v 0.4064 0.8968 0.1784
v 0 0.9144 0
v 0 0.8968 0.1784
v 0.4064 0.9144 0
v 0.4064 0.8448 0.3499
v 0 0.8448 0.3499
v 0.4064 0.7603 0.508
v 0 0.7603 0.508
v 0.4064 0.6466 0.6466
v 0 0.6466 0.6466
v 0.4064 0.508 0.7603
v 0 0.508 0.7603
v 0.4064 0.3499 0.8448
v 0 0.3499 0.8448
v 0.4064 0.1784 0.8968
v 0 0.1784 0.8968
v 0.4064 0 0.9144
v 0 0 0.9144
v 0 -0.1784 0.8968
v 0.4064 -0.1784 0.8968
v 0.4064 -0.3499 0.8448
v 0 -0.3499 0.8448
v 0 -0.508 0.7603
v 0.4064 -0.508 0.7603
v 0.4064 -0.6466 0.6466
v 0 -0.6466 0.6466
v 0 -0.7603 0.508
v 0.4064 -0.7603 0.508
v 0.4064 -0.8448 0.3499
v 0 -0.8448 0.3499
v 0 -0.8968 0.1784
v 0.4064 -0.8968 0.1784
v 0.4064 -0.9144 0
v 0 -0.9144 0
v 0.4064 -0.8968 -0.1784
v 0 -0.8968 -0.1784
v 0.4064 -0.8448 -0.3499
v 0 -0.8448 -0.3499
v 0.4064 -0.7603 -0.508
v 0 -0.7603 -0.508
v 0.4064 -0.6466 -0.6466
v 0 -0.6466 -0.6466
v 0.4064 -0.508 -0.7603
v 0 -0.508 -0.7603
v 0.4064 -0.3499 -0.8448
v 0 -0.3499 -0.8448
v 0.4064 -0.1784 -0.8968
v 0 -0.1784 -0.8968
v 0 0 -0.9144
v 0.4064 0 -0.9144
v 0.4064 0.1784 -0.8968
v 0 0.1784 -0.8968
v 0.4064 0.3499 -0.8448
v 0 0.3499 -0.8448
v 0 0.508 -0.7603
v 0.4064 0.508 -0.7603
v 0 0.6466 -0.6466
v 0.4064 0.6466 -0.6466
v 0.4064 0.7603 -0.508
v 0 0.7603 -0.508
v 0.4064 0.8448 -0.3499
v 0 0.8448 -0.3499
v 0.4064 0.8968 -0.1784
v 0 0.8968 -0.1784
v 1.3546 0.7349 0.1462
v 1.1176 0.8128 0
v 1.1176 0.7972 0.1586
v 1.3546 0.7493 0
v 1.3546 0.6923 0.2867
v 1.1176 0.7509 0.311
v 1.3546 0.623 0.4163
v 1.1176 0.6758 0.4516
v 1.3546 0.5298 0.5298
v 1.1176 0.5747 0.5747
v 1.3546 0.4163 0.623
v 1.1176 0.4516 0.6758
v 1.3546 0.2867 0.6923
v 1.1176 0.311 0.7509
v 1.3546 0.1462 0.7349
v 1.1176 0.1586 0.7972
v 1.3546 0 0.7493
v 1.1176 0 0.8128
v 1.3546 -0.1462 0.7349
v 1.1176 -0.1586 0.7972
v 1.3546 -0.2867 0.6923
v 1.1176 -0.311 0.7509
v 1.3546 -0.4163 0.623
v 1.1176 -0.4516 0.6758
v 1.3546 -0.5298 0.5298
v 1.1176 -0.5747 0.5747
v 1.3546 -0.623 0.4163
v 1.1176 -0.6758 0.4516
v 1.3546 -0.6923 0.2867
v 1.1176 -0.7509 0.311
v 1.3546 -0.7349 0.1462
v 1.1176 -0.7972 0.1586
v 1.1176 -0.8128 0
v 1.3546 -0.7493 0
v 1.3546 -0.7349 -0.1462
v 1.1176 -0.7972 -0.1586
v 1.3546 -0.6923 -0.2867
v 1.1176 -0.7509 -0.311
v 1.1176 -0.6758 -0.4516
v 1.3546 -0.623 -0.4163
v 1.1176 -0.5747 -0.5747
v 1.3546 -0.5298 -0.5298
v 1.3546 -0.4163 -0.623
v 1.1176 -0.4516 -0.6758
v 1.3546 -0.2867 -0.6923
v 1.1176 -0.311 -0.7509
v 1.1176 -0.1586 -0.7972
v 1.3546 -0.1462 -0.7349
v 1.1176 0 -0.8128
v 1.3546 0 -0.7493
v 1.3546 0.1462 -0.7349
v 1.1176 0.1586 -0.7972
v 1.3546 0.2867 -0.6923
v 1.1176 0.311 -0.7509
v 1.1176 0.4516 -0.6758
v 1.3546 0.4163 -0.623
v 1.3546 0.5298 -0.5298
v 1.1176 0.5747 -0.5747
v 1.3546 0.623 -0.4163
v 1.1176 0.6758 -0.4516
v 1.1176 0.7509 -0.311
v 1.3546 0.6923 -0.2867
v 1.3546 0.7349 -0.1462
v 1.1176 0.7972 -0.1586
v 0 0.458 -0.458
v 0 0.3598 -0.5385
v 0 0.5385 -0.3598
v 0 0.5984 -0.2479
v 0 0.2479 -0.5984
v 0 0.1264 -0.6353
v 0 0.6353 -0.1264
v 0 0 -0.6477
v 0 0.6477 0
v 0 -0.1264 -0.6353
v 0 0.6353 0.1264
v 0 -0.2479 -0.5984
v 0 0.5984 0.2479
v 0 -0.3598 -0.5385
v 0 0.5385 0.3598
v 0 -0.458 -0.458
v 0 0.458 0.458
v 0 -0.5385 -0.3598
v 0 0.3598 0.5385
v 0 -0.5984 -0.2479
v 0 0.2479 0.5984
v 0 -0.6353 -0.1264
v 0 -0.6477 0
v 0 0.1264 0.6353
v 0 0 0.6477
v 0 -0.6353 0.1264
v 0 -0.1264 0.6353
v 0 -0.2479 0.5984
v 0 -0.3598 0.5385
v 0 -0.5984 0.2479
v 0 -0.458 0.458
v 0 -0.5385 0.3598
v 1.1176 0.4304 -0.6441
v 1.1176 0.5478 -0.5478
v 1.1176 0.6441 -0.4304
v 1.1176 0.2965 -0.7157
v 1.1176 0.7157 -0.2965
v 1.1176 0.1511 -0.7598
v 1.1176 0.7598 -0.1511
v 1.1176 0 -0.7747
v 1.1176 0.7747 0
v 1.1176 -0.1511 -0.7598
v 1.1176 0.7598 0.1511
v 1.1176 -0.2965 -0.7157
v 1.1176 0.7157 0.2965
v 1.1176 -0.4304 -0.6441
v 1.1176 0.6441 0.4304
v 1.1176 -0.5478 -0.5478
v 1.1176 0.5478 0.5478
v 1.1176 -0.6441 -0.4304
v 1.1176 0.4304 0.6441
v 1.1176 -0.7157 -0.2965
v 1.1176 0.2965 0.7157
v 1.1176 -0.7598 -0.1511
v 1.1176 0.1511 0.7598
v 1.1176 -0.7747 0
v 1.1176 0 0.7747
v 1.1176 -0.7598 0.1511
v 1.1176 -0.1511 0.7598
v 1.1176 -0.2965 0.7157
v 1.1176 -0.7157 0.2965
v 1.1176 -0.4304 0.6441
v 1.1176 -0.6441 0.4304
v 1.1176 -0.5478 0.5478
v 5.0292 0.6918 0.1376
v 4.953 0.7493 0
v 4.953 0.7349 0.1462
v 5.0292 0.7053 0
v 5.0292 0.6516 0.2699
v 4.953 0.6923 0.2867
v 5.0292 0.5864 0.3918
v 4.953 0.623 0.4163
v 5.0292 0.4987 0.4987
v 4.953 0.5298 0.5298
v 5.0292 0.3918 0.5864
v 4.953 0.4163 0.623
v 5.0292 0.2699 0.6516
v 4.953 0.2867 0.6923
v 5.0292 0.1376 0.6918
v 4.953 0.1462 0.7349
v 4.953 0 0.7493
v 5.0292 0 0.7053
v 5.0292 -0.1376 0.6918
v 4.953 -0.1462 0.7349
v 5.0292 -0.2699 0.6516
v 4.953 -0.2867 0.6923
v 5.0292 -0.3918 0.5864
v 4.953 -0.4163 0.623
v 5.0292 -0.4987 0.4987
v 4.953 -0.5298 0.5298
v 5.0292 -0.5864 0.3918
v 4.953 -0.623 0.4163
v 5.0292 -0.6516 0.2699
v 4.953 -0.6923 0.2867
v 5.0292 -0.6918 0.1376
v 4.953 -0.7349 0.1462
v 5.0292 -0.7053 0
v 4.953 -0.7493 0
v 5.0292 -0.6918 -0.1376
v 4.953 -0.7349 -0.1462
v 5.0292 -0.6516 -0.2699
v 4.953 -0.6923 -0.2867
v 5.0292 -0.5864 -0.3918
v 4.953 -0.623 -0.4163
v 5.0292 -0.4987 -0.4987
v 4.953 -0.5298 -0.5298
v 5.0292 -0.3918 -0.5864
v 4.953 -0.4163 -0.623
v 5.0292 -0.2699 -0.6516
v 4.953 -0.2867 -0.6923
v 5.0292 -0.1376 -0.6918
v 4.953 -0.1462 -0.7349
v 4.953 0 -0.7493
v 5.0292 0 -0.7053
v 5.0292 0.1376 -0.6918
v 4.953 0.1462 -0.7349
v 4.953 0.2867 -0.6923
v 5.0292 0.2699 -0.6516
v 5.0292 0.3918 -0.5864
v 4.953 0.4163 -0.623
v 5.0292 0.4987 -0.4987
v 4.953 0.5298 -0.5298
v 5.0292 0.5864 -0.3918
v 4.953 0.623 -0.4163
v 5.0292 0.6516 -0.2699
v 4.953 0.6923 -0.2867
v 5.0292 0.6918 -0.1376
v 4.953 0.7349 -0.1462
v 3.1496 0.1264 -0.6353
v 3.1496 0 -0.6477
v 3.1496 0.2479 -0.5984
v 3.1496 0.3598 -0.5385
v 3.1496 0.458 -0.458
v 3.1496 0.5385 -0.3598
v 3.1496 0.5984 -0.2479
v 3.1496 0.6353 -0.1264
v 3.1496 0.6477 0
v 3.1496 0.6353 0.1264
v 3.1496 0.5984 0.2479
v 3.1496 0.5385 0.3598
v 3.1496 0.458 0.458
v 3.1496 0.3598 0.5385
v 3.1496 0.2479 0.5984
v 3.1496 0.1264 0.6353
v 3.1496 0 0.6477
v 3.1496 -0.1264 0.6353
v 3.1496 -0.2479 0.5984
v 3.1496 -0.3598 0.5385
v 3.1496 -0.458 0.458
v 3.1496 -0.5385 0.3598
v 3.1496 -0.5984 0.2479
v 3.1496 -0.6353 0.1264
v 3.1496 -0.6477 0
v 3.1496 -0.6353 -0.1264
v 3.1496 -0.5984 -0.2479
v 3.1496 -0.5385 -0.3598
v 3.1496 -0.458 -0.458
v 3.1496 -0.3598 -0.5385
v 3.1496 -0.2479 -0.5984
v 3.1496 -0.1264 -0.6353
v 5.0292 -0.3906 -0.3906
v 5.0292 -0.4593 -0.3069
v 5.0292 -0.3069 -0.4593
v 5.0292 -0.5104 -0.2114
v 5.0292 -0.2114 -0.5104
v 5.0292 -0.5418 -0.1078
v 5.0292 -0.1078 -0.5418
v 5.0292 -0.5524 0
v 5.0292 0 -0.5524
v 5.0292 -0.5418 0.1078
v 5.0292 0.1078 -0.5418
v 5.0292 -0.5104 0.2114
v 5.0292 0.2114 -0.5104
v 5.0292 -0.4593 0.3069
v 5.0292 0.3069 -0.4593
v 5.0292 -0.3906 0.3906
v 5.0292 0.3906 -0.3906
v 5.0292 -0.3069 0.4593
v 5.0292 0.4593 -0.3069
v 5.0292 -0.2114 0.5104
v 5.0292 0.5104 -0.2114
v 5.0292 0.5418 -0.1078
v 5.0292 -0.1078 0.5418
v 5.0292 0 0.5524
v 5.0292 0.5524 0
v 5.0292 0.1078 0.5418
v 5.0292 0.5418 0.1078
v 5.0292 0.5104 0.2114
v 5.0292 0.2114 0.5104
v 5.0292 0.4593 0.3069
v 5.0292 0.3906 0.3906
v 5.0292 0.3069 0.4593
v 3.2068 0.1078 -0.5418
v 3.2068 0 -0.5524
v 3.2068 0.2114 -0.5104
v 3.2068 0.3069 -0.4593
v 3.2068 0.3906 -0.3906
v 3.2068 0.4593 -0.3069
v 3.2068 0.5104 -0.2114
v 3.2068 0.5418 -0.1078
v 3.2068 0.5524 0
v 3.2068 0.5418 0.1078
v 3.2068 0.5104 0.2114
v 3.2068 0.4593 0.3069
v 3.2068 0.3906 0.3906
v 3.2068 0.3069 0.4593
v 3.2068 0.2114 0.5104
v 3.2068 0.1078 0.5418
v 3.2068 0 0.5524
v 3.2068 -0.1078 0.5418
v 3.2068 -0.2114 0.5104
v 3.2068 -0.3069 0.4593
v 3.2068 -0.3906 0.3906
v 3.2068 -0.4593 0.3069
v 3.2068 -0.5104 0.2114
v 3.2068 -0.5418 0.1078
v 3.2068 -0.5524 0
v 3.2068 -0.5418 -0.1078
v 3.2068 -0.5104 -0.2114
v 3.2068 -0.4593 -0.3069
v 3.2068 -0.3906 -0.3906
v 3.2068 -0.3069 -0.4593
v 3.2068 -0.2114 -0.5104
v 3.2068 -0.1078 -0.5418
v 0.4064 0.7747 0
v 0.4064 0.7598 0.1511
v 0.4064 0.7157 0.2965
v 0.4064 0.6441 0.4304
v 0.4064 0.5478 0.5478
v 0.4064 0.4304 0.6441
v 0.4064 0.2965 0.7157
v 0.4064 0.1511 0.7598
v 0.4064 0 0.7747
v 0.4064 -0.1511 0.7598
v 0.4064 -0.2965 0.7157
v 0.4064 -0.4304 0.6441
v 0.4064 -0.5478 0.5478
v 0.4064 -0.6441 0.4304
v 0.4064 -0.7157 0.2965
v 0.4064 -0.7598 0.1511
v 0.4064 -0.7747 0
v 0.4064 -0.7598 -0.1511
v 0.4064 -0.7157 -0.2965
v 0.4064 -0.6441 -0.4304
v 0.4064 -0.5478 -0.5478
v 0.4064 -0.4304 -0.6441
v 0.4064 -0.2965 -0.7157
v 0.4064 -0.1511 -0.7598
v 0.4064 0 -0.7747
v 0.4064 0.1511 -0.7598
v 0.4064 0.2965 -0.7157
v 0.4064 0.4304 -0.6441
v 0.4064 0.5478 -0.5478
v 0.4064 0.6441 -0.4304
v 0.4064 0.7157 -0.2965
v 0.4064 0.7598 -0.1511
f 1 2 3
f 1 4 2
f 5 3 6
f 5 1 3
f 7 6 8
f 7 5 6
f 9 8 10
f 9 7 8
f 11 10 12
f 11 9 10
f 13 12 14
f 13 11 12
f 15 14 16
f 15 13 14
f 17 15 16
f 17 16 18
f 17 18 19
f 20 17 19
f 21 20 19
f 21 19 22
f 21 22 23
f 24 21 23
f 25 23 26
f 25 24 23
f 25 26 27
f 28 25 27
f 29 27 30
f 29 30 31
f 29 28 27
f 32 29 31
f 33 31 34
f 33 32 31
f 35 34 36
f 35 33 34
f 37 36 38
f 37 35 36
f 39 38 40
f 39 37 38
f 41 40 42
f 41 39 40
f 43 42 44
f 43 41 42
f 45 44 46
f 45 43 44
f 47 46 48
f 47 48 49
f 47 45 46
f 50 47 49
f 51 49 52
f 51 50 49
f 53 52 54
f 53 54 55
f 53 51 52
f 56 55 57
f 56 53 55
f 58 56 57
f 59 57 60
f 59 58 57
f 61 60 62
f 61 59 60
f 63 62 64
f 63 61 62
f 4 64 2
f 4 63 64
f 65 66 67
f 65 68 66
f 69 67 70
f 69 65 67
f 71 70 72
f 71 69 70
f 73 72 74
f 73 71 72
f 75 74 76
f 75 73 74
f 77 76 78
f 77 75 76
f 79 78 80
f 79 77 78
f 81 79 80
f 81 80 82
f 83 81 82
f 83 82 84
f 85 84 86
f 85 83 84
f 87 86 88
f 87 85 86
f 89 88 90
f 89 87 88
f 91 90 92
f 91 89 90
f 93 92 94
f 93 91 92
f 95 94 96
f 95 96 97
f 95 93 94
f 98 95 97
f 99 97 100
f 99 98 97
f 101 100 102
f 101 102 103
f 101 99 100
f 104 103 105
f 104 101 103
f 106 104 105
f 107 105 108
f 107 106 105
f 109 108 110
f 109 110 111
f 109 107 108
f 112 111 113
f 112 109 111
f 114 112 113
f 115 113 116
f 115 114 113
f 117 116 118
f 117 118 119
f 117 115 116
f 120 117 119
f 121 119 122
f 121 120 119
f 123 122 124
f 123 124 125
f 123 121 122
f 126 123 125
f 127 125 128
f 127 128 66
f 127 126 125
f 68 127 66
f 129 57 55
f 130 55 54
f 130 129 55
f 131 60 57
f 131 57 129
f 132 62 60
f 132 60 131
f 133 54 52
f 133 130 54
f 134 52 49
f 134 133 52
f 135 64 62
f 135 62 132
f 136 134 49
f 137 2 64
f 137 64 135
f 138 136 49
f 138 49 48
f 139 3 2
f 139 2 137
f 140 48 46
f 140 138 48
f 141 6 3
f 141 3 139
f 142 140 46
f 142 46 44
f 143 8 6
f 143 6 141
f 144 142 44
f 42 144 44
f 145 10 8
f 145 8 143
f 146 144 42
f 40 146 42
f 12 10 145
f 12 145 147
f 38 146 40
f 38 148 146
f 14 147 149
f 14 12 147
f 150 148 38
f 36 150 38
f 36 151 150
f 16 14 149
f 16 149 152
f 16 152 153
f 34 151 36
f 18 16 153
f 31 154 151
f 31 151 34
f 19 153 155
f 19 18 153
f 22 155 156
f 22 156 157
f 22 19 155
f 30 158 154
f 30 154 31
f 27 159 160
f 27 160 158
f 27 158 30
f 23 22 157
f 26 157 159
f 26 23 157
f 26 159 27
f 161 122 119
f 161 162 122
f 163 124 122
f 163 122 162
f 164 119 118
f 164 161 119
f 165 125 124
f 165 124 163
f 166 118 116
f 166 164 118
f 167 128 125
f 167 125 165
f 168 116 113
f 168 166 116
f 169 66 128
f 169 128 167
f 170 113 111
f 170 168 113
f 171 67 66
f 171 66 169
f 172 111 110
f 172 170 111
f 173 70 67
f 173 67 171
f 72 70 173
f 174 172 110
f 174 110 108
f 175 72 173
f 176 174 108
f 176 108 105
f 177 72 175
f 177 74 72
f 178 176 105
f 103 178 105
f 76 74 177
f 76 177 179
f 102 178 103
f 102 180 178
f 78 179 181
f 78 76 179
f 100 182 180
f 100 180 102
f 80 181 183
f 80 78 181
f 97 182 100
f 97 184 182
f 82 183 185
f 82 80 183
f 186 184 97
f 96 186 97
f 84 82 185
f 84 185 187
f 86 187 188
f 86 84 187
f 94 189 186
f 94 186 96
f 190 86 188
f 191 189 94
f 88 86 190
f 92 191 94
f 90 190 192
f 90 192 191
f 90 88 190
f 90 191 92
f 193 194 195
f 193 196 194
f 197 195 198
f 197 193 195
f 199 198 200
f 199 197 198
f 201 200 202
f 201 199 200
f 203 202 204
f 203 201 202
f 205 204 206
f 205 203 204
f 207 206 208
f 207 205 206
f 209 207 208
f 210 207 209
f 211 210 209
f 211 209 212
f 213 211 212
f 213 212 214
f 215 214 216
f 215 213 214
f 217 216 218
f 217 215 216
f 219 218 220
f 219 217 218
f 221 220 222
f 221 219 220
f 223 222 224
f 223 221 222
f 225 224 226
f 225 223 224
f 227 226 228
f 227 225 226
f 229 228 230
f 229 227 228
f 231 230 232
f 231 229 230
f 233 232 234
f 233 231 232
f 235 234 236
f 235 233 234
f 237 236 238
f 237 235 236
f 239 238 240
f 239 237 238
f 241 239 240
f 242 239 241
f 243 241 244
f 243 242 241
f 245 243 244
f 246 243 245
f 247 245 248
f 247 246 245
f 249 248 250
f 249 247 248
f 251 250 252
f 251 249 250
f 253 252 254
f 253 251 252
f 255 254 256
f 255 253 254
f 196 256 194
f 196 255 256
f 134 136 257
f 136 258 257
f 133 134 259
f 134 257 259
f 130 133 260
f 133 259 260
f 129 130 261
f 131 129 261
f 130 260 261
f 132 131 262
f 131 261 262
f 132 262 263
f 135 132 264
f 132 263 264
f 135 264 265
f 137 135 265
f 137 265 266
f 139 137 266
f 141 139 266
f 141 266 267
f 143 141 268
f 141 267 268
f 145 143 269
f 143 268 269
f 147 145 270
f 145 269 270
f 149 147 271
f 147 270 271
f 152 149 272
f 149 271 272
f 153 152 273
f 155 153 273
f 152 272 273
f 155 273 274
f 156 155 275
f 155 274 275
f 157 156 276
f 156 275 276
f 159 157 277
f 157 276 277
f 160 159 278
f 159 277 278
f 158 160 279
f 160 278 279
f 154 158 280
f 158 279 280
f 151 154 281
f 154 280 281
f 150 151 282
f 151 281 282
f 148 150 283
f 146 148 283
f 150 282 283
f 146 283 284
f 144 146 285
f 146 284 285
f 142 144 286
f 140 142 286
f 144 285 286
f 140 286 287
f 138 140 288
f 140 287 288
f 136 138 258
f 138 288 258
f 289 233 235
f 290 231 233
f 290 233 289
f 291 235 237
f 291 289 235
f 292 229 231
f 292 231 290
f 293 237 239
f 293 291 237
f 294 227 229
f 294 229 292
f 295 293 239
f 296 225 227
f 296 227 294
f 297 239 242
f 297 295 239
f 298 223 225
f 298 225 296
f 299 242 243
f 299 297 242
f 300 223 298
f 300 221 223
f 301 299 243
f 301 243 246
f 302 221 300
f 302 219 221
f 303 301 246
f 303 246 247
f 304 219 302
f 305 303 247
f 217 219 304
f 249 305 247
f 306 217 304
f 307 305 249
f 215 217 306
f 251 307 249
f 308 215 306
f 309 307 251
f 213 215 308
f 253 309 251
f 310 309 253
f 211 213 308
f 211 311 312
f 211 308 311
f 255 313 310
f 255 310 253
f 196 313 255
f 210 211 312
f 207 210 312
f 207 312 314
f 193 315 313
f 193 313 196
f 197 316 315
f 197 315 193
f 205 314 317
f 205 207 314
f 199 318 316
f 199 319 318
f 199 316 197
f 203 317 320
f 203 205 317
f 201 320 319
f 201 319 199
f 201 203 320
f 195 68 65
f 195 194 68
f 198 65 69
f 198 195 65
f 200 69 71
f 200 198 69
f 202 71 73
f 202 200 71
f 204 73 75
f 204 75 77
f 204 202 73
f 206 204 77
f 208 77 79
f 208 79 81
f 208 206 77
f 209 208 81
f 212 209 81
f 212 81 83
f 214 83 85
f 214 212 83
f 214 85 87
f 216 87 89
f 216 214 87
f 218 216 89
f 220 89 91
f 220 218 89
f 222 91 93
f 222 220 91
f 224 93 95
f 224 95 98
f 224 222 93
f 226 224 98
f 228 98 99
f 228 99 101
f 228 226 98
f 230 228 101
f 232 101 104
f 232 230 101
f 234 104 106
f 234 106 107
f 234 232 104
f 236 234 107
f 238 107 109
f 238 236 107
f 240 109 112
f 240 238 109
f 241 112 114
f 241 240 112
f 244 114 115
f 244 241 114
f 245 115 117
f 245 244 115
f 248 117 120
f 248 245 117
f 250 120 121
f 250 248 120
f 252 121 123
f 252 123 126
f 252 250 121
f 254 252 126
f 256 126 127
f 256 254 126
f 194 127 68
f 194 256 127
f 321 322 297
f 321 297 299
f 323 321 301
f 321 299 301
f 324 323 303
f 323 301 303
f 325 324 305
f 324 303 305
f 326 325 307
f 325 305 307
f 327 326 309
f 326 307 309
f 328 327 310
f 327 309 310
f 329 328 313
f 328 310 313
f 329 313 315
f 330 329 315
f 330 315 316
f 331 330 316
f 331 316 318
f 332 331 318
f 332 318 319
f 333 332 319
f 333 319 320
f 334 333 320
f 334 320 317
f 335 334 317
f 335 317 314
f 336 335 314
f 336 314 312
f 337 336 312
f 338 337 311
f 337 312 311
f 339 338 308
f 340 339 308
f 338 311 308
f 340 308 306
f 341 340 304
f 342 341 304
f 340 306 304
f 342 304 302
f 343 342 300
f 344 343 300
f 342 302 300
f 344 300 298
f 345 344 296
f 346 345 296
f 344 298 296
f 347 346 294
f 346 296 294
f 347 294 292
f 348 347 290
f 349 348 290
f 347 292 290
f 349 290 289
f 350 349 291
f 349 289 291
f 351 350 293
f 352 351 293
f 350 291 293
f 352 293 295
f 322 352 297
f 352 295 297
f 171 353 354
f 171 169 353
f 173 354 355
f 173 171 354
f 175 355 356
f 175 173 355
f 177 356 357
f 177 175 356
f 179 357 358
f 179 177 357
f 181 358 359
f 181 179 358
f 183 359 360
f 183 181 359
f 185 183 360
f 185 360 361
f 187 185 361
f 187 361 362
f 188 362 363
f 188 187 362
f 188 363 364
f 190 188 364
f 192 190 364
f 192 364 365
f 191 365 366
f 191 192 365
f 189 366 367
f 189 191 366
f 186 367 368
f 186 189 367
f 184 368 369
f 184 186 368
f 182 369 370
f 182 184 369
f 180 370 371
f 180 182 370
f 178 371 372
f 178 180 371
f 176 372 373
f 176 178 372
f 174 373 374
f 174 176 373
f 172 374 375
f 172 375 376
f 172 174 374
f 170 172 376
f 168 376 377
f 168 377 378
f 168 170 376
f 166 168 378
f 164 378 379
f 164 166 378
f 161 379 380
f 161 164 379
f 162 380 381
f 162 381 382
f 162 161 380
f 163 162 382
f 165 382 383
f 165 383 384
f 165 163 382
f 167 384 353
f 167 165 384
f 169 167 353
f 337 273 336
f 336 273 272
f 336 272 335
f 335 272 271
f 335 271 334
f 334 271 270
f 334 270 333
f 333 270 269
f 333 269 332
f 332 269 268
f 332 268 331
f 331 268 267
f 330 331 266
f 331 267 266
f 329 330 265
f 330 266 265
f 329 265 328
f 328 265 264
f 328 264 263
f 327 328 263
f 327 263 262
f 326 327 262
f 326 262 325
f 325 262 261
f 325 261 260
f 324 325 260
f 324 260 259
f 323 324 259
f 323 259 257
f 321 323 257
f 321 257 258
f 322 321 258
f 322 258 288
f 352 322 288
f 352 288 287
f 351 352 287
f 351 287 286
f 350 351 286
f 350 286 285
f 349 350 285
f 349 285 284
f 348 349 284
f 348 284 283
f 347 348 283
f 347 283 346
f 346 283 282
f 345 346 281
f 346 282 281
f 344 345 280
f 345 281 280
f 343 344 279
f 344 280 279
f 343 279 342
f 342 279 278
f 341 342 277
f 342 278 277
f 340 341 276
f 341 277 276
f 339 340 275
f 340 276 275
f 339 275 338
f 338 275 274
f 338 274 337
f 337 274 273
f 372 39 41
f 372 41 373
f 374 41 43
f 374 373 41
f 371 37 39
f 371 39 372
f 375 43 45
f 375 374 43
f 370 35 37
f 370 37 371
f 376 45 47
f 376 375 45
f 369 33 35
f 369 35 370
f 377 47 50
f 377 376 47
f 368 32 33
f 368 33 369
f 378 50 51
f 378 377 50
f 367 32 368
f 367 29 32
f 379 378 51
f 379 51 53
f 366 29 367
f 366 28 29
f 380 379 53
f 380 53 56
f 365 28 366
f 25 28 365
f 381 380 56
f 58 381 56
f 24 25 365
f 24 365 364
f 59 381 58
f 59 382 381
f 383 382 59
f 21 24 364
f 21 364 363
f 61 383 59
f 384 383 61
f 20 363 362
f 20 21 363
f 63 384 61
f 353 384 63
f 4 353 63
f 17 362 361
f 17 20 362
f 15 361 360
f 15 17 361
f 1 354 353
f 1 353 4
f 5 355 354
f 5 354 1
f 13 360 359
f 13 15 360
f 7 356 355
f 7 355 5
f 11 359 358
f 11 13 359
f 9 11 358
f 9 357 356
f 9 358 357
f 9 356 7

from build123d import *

# Parameters (mm, degrees)
HOLE1_D     = 1.2954
HOLE1_DEPTH = 3.1496
HOLE1_TIP   = 0.389177423
HOLE2_D     = 1.1049
HOLE2_DEPTH = 5.0292
HOLE2_TIP   = 0.331945449


with BuildPart() as part:
    # Sketch1 → RevolutionAngle1 (revolve)
    with BuildSketch(Plane.XY):
        Polygon((0, 0), (0, 0.9144), (0.4064, 0.9144), (0.4064, 0.7747), (1.1176, 0.7747), (1.1176, 0.8128), (1.354585226, 0.7493), (4.953, 0.7493), (5.0292, 0.705305909), (5.0292, 0), align=None)
    revolve(axis=Axis((0, 0, 0), (1, 0, 0)))

    # Hole1
    with Locations(Plane.ZY):
        with Locations((0, 0)):
            Hole(HOLE1_D / 2, depth=HOLE1_DEPTH)
            with Locations((0, 0, -(HOLE1_DEPTH + HOLE1_TIP / 2))):  # 118° drill point
                Cone(0, HOLE1_D / 2, HOLE1_TIP, mode=Mode.SUBTRACT)

    # Hole2
    with Locations(Plane(origin=(0, 0.34063155, -0.647816844), x_dir=(0, 0, 1), z_dir=(-1, 0, 0))):
        with Locations((0.647816844, -0.34063155)):
            Hole(HOLE2_D / 2, depth=HOLE2_DEPTH)
            with Locations((0, 0, -(HOLE2_DEPTH + HOLE2_TIP / 2))):  # 118° drill point
                Cone(0, HOLE2_D / 2, HOLE2_TIP, mode=Mode.SUBTRACT)


solid = part.part
